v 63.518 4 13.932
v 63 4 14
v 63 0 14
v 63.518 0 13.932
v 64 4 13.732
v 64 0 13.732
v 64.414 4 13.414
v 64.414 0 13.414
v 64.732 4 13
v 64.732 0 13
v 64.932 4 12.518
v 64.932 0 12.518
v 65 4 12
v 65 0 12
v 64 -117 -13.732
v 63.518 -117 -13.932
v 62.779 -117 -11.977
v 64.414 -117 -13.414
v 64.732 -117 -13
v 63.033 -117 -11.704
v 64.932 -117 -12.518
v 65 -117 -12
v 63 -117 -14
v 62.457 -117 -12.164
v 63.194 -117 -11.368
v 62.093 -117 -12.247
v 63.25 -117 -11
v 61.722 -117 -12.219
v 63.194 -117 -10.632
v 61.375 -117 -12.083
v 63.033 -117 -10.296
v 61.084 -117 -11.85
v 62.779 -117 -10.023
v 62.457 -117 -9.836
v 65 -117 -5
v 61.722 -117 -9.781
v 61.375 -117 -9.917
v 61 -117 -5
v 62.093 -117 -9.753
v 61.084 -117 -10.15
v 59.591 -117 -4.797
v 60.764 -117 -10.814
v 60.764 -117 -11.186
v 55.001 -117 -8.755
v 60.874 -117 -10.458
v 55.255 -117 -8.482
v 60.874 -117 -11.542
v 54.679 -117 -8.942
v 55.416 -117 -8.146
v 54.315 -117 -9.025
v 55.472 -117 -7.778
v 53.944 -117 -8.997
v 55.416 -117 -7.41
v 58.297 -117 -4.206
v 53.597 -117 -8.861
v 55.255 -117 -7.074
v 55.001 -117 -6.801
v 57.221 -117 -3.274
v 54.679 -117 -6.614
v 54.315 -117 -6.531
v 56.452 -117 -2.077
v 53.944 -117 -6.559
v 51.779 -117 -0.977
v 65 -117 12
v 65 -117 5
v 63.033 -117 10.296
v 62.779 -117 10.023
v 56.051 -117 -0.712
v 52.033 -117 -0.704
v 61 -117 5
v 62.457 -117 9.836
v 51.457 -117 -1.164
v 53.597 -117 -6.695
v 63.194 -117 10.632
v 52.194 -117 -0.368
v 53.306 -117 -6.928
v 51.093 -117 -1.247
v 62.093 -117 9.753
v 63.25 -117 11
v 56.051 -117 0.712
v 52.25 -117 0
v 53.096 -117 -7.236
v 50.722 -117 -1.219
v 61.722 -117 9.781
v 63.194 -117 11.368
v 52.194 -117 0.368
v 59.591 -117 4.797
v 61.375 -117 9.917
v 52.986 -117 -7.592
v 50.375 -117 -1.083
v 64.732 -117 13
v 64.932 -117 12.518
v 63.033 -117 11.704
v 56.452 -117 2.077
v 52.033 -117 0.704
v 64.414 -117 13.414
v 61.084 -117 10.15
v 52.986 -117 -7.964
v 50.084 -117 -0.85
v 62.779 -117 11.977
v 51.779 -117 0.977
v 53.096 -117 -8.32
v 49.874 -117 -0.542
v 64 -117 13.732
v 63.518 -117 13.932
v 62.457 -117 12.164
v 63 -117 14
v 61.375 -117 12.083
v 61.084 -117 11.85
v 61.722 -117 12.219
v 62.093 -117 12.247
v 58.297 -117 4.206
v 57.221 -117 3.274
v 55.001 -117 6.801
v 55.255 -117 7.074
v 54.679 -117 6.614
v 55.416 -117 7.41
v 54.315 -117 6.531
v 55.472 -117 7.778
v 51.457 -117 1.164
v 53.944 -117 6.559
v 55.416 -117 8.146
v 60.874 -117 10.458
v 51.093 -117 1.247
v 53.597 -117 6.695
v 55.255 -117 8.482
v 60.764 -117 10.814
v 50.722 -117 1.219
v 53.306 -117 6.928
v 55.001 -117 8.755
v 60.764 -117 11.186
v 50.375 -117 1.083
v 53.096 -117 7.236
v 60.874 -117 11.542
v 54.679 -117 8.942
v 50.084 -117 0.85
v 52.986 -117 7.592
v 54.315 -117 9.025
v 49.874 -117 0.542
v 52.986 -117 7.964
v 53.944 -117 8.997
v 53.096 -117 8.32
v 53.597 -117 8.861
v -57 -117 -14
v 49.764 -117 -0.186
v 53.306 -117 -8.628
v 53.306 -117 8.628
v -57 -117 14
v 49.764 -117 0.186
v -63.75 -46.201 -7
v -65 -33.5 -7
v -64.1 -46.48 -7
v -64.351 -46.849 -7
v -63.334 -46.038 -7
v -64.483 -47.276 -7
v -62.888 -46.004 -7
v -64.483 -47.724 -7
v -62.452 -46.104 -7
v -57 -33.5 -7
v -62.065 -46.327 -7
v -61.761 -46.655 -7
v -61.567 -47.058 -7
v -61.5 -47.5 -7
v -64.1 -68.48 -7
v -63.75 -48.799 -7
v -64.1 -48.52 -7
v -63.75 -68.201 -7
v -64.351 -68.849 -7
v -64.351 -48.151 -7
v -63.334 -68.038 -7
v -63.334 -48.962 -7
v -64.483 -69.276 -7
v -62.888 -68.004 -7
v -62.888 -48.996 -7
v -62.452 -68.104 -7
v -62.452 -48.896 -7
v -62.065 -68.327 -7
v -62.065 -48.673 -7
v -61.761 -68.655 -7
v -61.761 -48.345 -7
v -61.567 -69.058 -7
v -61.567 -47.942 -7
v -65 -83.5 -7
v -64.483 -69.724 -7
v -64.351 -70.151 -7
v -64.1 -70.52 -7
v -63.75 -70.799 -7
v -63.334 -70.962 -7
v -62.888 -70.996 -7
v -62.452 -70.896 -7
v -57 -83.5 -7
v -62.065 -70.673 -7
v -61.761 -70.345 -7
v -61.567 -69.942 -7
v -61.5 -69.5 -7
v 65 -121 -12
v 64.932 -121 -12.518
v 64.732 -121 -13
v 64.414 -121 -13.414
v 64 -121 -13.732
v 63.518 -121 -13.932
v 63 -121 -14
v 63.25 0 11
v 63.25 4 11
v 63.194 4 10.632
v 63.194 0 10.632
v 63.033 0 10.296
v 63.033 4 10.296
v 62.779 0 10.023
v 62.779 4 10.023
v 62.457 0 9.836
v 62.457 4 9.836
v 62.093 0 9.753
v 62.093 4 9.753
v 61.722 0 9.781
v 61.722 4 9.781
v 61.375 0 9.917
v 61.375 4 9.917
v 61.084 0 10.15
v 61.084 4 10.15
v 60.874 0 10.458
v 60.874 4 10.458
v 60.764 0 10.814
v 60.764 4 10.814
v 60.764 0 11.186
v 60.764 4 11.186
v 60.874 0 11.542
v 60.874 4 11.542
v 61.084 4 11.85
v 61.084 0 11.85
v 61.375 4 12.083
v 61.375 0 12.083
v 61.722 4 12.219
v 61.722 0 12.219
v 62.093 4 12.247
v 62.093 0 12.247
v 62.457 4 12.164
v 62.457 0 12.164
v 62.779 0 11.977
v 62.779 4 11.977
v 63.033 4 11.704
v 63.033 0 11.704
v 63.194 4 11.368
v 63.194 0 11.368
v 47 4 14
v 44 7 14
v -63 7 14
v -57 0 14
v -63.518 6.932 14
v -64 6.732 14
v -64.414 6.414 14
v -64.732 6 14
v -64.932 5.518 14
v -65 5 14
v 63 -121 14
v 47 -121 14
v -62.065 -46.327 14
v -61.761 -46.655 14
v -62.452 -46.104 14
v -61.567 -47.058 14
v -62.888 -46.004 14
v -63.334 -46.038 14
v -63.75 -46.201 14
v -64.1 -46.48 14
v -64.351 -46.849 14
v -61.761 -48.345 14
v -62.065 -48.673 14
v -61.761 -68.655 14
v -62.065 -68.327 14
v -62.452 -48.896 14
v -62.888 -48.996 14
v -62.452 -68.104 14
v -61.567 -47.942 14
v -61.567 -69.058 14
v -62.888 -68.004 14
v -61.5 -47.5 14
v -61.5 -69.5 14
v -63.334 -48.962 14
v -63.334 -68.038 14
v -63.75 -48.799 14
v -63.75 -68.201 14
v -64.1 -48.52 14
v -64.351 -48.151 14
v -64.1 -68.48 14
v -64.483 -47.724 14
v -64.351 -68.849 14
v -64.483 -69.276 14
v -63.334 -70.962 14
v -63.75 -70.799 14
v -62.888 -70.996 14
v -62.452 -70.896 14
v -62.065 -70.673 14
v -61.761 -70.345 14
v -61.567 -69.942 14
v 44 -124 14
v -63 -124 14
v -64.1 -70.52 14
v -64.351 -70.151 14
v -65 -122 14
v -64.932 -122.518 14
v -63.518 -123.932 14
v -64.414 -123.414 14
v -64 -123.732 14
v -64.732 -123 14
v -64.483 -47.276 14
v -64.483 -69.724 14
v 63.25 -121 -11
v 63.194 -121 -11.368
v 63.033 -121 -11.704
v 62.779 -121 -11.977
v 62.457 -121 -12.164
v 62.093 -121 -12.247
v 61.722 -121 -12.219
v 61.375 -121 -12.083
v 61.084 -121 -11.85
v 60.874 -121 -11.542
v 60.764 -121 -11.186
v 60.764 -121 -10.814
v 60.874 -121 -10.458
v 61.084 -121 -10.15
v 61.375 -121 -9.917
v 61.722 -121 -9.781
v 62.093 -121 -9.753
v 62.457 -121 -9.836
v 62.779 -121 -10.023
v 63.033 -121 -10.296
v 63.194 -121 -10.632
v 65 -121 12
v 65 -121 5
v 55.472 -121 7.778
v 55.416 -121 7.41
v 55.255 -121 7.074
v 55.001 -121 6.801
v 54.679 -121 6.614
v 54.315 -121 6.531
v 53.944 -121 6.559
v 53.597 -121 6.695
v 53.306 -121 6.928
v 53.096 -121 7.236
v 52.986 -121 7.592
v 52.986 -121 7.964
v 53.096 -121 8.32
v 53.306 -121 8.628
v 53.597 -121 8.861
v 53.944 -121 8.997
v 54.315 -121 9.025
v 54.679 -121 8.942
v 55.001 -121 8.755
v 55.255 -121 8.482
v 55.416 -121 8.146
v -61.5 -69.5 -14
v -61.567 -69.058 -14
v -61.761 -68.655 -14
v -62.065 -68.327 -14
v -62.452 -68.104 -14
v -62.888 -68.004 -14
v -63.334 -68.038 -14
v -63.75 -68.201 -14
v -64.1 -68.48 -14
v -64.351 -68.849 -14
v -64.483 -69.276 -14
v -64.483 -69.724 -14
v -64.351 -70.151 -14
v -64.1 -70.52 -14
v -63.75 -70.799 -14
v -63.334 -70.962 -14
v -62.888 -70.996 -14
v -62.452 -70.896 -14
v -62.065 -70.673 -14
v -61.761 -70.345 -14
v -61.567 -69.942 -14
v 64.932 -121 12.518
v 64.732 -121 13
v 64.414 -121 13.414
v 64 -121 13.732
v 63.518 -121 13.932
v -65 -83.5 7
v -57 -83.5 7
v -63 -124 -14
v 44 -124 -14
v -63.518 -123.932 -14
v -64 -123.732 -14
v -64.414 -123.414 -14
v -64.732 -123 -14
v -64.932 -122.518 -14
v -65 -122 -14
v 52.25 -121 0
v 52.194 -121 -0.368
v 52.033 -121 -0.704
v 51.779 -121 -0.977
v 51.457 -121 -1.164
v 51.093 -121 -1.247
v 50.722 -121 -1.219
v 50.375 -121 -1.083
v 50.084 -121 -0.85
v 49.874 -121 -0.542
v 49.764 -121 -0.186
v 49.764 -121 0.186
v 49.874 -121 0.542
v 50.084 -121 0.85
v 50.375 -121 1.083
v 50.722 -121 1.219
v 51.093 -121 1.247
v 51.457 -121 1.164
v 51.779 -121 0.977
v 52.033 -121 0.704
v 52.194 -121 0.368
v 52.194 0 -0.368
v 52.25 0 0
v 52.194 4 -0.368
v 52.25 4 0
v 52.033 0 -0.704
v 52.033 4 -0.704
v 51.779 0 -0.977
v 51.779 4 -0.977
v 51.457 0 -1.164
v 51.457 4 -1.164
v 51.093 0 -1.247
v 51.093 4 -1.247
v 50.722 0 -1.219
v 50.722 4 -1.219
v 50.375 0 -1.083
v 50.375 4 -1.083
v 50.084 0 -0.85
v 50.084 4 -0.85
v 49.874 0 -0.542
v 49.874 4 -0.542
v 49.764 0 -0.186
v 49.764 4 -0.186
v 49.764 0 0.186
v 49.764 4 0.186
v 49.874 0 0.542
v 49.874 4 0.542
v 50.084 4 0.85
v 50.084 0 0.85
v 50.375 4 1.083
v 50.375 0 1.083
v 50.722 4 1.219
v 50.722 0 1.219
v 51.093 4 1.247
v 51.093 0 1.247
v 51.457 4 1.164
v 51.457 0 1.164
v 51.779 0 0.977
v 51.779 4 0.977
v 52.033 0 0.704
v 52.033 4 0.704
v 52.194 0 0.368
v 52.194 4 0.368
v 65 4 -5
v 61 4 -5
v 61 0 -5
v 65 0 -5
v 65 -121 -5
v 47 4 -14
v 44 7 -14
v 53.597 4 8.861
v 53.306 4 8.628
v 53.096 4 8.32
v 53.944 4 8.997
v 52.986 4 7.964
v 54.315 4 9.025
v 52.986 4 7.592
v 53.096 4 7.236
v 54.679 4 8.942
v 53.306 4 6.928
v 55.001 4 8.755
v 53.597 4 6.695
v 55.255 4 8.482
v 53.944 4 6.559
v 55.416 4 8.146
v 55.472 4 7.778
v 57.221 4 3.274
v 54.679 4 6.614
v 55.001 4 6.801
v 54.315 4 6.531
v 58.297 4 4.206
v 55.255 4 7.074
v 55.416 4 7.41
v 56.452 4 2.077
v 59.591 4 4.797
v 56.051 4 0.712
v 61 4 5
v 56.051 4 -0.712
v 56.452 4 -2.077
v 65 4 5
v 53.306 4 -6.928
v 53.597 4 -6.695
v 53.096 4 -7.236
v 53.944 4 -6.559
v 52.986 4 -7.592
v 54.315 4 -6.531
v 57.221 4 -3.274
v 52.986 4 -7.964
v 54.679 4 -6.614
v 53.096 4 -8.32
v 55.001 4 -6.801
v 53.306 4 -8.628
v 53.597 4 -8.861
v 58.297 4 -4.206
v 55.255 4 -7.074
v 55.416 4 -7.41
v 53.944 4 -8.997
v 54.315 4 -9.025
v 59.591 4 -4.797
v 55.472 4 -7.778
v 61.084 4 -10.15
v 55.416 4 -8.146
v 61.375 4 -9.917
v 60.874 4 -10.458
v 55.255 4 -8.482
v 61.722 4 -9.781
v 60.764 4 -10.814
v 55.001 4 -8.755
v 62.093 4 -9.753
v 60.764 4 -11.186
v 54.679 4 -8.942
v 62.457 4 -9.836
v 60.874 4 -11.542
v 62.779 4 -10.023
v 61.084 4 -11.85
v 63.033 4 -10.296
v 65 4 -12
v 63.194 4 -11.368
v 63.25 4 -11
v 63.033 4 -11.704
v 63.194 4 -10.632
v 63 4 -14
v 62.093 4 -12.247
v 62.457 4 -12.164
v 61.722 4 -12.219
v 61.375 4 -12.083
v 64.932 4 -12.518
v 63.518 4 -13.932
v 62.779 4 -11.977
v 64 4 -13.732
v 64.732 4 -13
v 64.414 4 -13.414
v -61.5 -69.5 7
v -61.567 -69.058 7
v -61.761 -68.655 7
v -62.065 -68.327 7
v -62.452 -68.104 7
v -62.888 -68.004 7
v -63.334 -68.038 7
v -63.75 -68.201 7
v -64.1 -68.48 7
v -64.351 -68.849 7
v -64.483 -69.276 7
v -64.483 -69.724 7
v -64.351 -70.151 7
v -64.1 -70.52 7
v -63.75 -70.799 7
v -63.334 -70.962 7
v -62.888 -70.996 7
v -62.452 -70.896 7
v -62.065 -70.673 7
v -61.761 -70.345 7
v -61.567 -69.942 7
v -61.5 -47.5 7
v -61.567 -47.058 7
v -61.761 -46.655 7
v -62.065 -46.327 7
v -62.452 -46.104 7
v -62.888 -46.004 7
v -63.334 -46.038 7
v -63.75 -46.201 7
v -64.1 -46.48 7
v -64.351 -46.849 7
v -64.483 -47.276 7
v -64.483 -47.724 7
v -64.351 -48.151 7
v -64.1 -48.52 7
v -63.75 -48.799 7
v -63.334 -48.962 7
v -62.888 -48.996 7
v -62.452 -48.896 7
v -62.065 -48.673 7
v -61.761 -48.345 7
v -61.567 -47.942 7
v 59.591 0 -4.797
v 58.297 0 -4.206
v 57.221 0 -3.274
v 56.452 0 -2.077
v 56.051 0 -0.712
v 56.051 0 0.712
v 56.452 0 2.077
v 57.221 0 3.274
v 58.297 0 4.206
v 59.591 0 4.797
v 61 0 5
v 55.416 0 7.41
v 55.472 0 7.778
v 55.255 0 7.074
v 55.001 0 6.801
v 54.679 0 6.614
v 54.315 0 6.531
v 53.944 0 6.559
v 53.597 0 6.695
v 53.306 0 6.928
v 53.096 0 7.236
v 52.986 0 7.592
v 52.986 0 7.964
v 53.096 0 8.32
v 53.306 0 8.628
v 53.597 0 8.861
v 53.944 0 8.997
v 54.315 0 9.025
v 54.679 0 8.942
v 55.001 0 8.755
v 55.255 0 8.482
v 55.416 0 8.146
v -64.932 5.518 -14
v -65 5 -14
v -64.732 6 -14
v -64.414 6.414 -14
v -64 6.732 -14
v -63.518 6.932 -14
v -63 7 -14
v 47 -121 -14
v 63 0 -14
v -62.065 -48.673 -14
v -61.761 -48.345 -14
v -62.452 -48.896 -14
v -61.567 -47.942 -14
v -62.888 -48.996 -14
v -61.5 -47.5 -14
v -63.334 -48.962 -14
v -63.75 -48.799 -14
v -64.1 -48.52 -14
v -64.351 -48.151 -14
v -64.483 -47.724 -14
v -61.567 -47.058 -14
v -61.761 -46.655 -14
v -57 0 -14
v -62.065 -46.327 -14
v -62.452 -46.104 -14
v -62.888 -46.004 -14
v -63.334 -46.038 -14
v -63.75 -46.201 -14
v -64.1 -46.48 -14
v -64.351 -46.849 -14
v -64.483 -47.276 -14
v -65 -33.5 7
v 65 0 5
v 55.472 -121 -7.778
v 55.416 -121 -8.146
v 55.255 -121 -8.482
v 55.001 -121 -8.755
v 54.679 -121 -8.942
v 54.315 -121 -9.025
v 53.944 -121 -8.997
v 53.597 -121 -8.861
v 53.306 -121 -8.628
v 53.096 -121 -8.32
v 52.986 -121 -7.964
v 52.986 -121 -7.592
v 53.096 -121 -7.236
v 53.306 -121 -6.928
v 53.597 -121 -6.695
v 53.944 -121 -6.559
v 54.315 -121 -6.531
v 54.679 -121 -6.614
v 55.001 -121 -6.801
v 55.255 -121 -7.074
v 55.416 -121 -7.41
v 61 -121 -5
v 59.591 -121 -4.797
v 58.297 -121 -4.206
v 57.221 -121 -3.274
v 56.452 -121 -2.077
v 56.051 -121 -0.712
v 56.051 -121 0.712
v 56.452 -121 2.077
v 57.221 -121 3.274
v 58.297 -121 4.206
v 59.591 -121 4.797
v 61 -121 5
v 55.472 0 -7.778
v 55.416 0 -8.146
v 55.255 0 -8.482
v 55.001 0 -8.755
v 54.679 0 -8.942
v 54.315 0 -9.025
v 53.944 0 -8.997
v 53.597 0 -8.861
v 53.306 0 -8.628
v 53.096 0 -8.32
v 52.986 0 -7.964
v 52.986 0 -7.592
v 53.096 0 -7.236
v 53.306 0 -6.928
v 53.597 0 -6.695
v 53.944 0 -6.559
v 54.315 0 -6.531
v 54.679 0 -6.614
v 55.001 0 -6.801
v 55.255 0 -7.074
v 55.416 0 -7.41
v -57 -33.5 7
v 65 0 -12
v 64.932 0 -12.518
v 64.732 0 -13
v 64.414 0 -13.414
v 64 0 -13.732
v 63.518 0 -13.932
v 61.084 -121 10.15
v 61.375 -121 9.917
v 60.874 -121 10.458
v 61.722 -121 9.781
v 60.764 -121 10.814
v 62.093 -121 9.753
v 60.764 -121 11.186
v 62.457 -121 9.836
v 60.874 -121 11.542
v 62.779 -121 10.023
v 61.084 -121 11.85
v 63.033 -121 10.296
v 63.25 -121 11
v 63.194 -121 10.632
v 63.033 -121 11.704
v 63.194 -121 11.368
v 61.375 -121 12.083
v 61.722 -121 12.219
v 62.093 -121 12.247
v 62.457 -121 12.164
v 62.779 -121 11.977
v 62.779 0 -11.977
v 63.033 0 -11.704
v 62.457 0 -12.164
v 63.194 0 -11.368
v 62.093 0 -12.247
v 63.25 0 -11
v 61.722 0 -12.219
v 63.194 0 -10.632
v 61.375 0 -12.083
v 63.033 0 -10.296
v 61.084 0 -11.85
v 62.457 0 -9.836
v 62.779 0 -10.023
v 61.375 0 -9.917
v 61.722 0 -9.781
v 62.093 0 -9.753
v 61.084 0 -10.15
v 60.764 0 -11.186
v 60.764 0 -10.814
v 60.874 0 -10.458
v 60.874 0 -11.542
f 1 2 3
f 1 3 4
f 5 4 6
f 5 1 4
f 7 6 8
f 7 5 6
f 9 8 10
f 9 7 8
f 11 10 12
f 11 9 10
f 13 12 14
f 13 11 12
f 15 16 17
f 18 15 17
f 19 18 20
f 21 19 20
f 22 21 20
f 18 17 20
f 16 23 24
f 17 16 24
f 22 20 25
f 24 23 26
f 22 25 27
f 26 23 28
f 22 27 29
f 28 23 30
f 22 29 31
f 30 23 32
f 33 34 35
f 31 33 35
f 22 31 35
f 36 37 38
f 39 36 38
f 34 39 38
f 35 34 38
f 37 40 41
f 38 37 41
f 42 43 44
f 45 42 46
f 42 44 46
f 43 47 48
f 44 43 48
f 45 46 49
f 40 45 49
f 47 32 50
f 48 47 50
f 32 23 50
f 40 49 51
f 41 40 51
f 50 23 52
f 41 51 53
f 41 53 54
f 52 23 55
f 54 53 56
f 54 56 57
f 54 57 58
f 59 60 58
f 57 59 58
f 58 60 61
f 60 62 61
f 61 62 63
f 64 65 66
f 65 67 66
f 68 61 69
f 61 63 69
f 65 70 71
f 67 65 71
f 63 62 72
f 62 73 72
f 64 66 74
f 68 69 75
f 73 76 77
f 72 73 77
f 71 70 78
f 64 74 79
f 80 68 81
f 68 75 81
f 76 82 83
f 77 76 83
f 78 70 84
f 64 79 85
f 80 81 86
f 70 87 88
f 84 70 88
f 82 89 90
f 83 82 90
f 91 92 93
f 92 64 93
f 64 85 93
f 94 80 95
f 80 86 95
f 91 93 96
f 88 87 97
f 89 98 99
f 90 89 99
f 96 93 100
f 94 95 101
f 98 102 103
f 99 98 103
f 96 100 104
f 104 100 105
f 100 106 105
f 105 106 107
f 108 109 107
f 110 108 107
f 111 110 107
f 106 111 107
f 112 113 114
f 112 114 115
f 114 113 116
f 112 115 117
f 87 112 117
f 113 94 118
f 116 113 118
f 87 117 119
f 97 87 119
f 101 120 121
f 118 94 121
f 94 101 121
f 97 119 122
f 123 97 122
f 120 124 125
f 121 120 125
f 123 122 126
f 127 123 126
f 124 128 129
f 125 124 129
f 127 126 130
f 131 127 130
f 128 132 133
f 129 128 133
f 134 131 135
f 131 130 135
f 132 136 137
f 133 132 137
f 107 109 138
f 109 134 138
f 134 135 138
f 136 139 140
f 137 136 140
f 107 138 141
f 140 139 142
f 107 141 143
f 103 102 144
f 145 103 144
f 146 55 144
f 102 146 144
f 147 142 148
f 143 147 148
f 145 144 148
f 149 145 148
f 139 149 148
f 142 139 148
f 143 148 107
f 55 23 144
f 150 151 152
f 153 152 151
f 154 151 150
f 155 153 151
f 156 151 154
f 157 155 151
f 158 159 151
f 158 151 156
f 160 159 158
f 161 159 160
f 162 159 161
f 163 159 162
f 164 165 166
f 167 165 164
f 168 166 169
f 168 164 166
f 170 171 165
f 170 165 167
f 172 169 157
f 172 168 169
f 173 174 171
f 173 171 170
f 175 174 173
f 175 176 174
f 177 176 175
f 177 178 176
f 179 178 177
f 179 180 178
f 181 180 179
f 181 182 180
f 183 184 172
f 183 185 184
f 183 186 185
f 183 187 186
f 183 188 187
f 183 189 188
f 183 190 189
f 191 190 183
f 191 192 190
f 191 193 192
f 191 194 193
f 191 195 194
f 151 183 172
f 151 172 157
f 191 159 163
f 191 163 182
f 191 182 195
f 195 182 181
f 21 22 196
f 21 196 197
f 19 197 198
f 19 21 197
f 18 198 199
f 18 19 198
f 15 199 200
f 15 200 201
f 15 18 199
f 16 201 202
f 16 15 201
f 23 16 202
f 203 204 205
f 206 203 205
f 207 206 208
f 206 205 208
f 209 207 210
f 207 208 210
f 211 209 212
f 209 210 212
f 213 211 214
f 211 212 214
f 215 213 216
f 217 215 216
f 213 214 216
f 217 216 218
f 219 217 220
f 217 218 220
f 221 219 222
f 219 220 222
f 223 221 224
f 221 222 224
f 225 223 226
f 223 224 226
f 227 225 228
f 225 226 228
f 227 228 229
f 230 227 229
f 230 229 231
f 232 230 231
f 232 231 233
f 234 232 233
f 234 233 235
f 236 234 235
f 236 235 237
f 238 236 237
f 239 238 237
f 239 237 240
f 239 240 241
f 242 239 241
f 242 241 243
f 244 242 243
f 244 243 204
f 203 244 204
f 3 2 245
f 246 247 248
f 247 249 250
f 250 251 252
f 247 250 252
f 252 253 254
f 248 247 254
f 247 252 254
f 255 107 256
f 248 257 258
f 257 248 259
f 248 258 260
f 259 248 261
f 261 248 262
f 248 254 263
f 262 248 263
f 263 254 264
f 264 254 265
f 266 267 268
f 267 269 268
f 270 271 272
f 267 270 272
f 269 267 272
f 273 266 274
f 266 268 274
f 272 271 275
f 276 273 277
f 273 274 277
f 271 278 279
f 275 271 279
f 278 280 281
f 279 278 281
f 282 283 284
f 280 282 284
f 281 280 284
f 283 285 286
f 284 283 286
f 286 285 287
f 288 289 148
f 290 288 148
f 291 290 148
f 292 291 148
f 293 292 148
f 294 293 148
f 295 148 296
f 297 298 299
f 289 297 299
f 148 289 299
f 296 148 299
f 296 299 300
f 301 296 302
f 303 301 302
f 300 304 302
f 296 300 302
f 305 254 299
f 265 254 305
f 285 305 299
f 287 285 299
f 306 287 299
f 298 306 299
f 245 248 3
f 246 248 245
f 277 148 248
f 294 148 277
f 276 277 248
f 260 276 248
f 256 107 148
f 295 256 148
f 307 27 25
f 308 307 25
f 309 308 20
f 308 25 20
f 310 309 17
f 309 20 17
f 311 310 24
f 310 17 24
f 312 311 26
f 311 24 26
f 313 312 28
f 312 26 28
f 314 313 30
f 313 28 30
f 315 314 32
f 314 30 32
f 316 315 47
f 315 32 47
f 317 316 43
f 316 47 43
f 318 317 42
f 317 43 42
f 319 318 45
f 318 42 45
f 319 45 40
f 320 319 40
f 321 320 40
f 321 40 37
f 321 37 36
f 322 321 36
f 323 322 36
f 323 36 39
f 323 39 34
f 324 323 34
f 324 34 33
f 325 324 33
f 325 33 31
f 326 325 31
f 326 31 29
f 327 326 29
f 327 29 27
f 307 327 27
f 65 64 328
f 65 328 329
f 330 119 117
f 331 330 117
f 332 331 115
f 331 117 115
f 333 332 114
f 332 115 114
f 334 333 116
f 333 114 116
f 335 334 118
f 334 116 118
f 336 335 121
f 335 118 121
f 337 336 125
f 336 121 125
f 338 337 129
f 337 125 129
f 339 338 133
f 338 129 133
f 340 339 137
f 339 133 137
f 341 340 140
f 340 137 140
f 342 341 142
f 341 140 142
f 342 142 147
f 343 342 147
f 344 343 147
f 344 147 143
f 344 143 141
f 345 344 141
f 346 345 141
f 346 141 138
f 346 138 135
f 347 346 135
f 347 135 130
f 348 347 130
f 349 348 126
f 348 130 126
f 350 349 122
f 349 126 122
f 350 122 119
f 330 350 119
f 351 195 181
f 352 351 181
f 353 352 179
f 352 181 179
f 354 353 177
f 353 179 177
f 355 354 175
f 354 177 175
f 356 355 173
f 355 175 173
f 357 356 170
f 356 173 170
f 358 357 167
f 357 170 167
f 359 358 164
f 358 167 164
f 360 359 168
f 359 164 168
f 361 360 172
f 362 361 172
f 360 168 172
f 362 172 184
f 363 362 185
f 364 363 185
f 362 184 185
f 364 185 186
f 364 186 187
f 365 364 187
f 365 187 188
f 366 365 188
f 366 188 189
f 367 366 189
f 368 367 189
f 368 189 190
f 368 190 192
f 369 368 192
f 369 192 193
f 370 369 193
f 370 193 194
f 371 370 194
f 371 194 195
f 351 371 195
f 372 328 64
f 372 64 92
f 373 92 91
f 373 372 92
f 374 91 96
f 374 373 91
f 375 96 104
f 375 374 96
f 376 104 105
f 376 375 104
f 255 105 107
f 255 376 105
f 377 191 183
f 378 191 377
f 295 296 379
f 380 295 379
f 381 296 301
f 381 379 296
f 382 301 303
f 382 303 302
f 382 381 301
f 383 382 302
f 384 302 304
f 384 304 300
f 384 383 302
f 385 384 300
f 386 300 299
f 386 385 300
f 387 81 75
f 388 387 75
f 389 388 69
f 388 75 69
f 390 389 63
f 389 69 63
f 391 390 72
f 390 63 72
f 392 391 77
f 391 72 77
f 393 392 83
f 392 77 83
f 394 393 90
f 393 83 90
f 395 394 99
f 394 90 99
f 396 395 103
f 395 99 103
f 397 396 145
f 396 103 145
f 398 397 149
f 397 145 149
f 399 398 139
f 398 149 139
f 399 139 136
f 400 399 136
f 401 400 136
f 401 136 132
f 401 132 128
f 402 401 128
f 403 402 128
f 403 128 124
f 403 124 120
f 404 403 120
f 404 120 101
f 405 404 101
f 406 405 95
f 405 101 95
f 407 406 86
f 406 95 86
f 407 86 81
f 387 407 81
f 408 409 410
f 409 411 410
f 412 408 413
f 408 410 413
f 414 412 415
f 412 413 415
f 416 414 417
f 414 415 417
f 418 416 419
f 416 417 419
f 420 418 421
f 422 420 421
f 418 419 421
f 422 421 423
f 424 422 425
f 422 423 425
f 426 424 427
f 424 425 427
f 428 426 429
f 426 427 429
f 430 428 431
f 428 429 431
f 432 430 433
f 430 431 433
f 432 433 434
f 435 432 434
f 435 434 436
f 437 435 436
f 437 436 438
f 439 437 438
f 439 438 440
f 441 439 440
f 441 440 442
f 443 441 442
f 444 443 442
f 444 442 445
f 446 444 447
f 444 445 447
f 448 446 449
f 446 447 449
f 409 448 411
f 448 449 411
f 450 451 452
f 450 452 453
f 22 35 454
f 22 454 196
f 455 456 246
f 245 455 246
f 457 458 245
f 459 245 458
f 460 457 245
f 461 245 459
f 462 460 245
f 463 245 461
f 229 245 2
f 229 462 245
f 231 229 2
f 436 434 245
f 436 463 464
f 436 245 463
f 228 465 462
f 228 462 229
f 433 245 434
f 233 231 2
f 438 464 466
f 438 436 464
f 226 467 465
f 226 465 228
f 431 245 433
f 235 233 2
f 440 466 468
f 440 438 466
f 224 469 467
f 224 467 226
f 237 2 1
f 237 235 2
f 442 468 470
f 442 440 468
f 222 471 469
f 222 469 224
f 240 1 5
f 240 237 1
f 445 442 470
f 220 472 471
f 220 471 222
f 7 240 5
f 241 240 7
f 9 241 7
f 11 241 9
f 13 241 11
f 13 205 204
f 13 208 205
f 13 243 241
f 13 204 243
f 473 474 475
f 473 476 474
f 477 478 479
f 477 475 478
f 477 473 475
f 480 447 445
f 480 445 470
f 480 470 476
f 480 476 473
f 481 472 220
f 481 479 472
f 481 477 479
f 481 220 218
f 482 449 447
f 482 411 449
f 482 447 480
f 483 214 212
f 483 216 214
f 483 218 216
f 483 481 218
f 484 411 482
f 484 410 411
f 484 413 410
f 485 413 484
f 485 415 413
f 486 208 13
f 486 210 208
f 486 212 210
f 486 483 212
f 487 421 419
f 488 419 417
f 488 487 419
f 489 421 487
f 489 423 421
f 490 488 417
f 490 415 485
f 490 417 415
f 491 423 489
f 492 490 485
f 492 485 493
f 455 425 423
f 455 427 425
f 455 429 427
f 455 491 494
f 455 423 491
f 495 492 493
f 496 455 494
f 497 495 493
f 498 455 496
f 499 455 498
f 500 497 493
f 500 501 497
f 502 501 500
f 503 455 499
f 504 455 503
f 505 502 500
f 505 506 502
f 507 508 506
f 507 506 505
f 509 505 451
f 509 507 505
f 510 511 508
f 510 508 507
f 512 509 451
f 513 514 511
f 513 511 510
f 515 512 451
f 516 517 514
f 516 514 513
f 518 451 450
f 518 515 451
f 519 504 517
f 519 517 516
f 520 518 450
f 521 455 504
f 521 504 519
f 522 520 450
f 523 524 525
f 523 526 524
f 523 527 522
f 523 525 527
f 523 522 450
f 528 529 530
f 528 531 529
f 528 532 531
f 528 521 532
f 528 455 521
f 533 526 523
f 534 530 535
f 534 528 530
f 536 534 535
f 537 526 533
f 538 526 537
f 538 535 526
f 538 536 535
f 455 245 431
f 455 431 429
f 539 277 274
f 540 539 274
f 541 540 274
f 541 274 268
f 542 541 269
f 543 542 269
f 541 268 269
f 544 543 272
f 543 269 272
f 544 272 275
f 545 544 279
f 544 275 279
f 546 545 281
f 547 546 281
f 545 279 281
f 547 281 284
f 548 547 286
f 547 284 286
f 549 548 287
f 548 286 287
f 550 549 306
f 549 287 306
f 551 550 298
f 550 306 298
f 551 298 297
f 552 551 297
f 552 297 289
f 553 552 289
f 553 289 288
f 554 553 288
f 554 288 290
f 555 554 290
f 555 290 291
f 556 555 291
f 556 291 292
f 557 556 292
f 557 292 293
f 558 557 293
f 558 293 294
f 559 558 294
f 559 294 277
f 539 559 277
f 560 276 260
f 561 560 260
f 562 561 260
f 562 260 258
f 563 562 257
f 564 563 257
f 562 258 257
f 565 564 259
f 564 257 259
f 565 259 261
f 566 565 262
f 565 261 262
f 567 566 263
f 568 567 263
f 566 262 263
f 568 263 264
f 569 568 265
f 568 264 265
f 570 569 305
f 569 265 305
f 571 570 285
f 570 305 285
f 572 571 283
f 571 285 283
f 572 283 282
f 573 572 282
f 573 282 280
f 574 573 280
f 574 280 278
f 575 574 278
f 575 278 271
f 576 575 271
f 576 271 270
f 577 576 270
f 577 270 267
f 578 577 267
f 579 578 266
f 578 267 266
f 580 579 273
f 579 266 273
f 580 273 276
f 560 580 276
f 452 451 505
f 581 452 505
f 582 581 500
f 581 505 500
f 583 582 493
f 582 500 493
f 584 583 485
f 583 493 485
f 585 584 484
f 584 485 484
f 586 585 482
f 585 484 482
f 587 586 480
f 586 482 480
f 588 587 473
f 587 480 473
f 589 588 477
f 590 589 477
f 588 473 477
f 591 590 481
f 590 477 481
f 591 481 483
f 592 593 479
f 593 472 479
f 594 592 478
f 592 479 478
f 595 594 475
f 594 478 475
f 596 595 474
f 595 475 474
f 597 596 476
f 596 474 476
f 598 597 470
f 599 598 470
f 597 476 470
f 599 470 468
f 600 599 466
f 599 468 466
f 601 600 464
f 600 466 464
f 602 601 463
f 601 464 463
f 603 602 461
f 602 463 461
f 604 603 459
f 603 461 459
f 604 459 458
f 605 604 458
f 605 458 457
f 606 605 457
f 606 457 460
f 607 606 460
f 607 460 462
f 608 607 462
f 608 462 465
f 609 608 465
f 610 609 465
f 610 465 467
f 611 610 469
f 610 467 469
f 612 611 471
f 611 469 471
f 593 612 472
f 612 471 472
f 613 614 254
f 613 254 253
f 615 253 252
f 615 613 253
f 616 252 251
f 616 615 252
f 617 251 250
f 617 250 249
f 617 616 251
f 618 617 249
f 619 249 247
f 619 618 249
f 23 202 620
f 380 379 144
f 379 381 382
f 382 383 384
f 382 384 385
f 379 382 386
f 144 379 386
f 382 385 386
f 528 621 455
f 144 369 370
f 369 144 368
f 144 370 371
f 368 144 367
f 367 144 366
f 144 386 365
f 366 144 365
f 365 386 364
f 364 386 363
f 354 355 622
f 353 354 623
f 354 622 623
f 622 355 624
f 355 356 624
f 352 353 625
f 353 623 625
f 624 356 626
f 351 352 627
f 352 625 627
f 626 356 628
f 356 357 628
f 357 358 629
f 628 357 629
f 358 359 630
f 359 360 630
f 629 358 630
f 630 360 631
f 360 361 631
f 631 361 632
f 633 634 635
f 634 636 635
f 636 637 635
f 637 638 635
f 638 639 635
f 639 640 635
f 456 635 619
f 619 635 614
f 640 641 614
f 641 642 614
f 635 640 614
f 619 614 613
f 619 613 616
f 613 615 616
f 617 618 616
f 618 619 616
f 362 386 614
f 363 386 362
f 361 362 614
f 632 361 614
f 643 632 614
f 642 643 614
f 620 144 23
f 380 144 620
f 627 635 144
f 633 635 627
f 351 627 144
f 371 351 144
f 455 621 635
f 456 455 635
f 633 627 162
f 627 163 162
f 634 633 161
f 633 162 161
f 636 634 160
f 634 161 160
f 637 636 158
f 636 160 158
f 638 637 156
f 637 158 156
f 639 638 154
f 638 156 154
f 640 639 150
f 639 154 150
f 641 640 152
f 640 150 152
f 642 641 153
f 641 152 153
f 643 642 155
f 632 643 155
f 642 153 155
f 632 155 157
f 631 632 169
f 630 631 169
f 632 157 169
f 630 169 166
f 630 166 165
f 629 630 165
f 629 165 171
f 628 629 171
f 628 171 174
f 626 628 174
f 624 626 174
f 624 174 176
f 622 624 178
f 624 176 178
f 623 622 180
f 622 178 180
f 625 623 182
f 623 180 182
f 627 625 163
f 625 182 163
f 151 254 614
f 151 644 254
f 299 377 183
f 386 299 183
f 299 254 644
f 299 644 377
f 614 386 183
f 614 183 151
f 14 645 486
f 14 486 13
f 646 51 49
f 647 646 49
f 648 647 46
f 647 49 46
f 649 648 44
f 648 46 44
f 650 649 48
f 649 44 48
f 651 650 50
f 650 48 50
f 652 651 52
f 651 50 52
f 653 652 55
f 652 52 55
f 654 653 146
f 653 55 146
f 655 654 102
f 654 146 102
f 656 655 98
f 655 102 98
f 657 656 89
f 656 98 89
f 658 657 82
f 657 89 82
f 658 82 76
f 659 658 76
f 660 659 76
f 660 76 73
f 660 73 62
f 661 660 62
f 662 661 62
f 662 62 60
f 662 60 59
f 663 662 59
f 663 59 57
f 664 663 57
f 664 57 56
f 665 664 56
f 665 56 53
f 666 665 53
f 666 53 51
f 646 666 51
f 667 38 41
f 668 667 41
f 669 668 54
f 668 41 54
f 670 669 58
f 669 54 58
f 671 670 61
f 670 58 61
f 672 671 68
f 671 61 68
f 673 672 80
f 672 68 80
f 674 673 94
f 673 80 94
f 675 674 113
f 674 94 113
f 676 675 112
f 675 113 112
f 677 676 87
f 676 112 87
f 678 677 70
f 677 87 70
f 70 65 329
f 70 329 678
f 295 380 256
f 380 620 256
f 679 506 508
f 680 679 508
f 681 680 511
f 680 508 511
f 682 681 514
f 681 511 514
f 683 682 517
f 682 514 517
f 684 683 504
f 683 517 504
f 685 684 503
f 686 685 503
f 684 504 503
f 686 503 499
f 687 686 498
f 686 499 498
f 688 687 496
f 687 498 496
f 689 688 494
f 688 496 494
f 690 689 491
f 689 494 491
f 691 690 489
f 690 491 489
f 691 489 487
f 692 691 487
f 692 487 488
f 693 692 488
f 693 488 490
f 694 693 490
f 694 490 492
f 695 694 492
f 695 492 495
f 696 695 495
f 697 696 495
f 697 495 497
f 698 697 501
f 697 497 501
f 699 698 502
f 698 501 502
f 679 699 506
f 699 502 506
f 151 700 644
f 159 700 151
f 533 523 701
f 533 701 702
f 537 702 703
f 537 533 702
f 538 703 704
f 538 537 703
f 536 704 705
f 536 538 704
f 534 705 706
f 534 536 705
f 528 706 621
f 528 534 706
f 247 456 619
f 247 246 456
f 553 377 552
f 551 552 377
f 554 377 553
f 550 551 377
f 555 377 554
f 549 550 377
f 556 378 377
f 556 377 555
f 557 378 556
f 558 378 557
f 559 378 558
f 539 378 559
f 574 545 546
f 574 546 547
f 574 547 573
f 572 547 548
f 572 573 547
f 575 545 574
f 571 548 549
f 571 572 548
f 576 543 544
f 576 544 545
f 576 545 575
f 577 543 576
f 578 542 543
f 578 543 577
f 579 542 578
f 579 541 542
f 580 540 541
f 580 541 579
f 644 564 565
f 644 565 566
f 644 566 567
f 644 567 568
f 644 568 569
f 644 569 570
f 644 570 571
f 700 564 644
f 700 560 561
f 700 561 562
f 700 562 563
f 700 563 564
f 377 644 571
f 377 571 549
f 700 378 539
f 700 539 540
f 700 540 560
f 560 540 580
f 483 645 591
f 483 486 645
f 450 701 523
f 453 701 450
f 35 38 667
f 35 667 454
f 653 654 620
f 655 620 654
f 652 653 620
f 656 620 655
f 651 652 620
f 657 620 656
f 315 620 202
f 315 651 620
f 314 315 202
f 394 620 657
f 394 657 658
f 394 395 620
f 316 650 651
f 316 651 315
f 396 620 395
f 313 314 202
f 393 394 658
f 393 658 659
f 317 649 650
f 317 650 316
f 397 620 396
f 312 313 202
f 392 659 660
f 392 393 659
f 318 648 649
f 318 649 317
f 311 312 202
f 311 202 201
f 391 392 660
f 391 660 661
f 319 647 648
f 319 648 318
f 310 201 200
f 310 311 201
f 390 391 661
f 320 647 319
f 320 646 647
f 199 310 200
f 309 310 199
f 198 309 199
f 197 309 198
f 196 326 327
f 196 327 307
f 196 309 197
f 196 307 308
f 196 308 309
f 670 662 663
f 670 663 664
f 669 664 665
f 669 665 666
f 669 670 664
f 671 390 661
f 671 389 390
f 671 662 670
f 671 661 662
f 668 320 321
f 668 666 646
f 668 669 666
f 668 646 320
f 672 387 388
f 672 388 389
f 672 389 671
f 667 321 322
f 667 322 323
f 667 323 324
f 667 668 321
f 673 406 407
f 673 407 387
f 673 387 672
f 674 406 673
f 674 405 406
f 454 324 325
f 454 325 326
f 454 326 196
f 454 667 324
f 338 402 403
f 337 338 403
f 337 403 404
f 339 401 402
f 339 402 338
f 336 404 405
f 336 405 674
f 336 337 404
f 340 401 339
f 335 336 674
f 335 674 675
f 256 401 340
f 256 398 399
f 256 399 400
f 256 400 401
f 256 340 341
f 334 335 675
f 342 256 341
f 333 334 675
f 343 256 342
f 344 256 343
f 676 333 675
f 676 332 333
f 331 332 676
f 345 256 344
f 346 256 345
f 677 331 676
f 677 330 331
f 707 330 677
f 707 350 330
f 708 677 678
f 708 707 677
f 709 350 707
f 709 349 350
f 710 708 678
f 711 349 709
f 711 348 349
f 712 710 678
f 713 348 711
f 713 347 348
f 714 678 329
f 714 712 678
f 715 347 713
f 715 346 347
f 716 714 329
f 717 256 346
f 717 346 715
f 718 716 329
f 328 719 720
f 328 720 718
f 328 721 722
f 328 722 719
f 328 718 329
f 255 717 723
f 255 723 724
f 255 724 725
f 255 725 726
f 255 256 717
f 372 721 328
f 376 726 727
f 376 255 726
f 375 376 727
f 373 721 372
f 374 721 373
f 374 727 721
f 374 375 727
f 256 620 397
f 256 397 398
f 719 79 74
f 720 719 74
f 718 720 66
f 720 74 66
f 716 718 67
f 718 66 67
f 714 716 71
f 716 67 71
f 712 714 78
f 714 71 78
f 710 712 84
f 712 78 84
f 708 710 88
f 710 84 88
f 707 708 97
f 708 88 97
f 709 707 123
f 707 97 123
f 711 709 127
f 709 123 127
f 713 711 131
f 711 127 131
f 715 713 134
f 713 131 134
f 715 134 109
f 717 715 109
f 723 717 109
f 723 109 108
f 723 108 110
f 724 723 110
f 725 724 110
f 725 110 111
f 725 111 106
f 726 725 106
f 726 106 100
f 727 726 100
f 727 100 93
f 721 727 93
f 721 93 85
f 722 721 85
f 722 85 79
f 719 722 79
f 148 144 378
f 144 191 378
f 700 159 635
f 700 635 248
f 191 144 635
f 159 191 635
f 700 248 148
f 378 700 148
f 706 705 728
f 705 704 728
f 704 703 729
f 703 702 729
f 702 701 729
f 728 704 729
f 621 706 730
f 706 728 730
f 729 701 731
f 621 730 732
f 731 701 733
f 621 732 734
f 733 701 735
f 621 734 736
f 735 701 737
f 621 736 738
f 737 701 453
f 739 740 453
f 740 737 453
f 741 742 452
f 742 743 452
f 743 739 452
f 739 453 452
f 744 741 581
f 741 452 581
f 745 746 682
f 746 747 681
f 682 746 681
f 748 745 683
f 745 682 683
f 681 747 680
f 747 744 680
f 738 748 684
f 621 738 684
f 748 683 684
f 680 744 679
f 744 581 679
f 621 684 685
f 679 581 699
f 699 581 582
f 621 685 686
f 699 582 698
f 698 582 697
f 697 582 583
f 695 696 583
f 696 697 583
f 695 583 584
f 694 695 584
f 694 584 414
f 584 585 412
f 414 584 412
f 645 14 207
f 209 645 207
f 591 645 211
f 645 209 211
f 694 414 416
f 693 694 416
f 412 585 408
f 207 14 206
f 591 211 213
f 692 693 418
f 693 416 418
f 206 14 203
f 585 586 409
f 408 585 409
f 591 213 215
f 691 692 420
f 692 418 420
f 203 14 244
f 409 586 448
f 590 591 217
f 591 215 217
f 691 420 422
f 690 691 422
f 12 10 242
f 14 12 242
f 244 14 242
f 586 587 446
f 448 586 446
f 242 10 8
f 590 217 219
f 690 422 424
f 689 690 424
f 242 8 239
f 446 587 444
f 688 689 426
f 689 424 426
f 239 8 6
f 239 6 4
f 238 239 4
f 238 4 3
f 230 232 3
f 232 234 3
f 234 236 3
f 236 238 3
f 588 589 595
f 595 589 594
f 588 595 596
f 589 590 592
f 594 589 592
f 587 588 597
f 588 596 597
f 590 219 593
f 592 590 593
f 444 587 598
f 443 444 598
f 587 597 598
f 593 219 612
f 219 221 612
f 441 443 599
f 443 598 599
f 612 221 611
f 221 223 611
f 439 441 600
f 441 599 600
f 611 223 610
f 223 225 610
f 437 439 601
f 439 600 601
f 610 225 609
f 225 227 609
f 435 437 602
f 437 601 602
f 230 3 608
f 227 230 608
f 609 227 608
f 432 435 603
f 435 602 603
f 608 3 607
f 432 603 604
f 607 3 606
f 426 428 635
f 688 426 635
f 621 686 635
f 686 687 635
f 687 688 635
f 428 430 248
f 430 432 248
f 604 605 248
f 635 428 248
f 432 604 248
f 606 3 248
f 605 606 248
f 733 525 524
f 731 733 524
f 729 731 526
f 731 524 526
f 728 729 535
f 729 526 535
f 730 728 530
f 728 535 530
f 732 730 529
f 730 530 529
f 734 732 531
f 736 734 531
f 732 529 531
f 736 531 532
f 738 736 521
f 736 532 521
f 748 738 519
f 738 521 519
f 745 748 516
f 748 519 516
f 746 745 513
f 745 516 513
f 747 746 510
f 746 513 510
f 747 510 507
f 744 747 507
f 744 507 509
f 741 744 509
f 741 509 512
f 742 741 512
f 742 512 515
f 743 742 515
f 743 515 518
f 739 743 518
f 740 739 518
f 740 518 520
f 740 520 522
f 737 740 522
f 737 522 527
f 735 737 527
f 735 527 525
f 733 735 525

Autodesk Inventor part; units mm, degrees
ref_plane "YZ Plane" through (0, 0, 0) normal (1, 0, 0) x (0, 1, 0)
ref_plane "XZ Plane" through (0, 0, 0) normal (0, 1, 0) x (-1, 0, 0)
ref_plane "XY Plane" through (0, 0, 0) normal (0, 0, 1) x (1, 0, 0)
sketch "스케치1" plane through (0, 0, 0) normal (0, 1, 0) x (-1, 0, 0)
  line L0 (65, -14) -> (-65, -14)
  line L1 (-65, -14) -> (-65, 14)
  line L2 (-65, 14) -> (65, 14)
  line L3 (65, 14) -> (65, -14)
  point P0 (0, 0)
  dimension "d0" = 28
  dimension "d1" = 130
  dimension "d2" = 14
  dimension "d3" = 65
extrude "돌출1" add sketch "스케치1" along normal blind 7
sketch "스케치4" plane through (0, 0, 0) normal (0, -1, 0) x (1, 0, 0)
  line L0 (-65, -14) -> (65, -14) projected
  line L1 (65, 14) -> (-65, 14) projected
  line L2 (-65, -14) -> (-57, -14)
  line L3 (-57, -14) -> (-57, 14)
  line L4 (-57, 14) -> (-65, 14)
  line L5 (-65, 14) -> (-65, -14)
  point P0 (0, 0)
  point P1 (63, -14)
  point P2 (63, 14)
  dimension "d26" = 8
extrude "돌출4" add sketch "스케치4" along normal blind 124
fillet "모깎기2" radius 2 1 edges at (-65, 7, 0)
sketch "스케치5" plane through (-57, 0, 14) normal (1, 0, 0) x (0, 0, -1)
  point P0 (14, 0)
sketch "스케치10" plane through (-57, 0, 14) normal (1, 0, 0) x (0, 0, -1)
  line L0 (0, -124) -> (28, -124) projected
  line L1 (28, -124) -> (28, 5) projected
  line L2 (0, -124) -> (28, -124)
  line L3 (28, -124) -> (28, -117)
  line L4 (28, -117) -> (0, -117)
  line L5 (0, -117) -> (0, -124)
  point P0 (14, 0)
  dimension "d52" = 7
extrude "돌출9" add sketch "스케치10" along normal blind 122
sketch "스케치2" plane through (0, 7, 0) normal (0, 1, 0) x (1, 0, 0)
  circle A0 centre (61, 0) radius 5
  line L0 (61, 5) -> (65, 5)
  line L1 (65, 5) -> (65, -5)
  line L2 (65, -5) -> (61, -5)
  line L3 (61, -5) -> (61, 5)
  line L4 (65, -14) -> (65, 14) projected
  point P0 (0, 0)
  dimension "d6" = 10
  dimension "d7" = 0
  dimension "d8" = 10
  dimension "d9" = 5
  dimension "d10" = 4
  dimension "d11" = 0
extrude "돌출2" cut sketch "스케치2" against normal blind 180
sketch "스케치3" plane through (0, 7, 0) normal (0, 1, 0) x (1, 0, 0)
  circle A0 centre (62, 11) radius 1.25
  line L0 (65, 5) -> (65, 14) projected
  line L1 (65, 14) -> (-65, 14) projected
  line L2 (0, 0) -> (4.9885, 0)
  circle A1 centre (62, -11) radius 1.25
  circle A2 centre (51, 0) radius 1.25
  line L3 (-65, -14) -> (65, -14) projected
  circle A3 centre (54.222, -7.778) radius 1.25
  line L4 (65, -14) -> (65, -5) projected
  circle A4 centre (54.222, 7.778) radius 1.25
  dimension "d14" = 2.5
  dimension "d15" = 3
  dimension "d16" = 3
  dimension "d17" = 14
  dimension "d18" = 2.5
  dimension "d19" = 14
  dimension "d20" = 10.778
  dimension "d21" = 6.222
  dimension "d22" = 2.5
extrude "돌출3" cut sketch "스케치3" against normal blind 100000
fillet "모깎기4" radius 2 5 edges at (65, -120.5, 14) (65, -120.5, -14) (65, 3.5, -14) (65, 3.5, 14) (-65, -124, 0)
sketch "스케치11" plane through (-57, -117, 14) normal (0, 0, 1) x (1, 0, 0)
  circle A0 centre (-6, 47.5) radius 1.5
  circle A1 centre (-6, 69.5) radius 1.5
  line L0 (-8, 122) -> (-8, -5) projected
  line L1 (181.1056, 58.5) -> (-67.096, 58.5)
  point P0 (57, 117)
  dimension "d56" = 3
  dimension "d57" = 3
  dimension "d58" = 2
  dimension "d59" = 2
  dimension "d60" = 22
  dimension "d61" = 58.5
  dimension "d62" = 11
extrude "돌출10" cut sketch "스케치11" against normal blind 122
sketch "스케치12" plane through (-57, 0, 14) normal (1, 0, 0) x (0, 0, -1)
  line L0 (7, -33.5) -> (21, -33.5)
  line L1 (21, -33.5) -> (21, -83.5)
  line L2 (21, -83.5) -> (7, -83.5)
  line L3 (7, -83.5) -> (7, -33.5)
  line L4 (0, 0) -> (0, -117) projected
  line L5 (28, 0) -> (28, -117) projected
  line L6 (-36.3144, -58.5) -> (56.0369, -58.5)
  line L7 (9, -117) -> (19, -117) projected
  point P0 (14, 0)
  dimension "d65" = 7
  dimension "d66" = 7
  dimension "d67" = 50
  dimension "d68" = 58.5
  dimension "d69" = 25
extrude "돌출11" cut sketch "스케치12" against normal blind 122
sketch "스케치13" plane through (0, -124, 0) normal (0, -1, 0) x (1, 0, 0)
  line L0 (-63, 14) -> (63, 14) projected
  line L1 (47, 14) -> (65, 14)
  line L2 (65, 14) -> (65, -15.4156)
  line L3 (65, -15.4156) -> (47, -15.4156)
  line L4 (47, -15.4156) -> (47, 14)
  line L5 (65, 12) -> (65, 5) projected
  point P0 (0, 0)
  dimension "d72" = 18
  dimension "d73" = 0
extrude "돌출12" cut sketch "스케치13" against normal blind 3
sketch "스케치14" plane through (0, 7, 0) normal (0, 1, 0) x (1, 0, 0)
  line L0 (-57, -14) -> (63, -14) projected
  line L1 (-57, 14) -> (63, 14) projected
  line L2 (47, -14) -> (65, -14)
  line L3 (65, -14) -> (65, 14)
  line L4 (65, 14) -> (47, 14)
  line L5 (47, 14) -> (47, -14)
  line L6 (65, -12) -> (65, -5) projected
  point P0 (0, 0)
  dimension "d76" = 18
  dimension "d77" = 0
extrude "돌출13" cut sketch "스케치14" against normal blind 3
chamfer "모따기1" distance 3 angle 45 2 edges at (47, 7, 0) (47, -124, 0)
properties part number "shoulder_gear_3"
